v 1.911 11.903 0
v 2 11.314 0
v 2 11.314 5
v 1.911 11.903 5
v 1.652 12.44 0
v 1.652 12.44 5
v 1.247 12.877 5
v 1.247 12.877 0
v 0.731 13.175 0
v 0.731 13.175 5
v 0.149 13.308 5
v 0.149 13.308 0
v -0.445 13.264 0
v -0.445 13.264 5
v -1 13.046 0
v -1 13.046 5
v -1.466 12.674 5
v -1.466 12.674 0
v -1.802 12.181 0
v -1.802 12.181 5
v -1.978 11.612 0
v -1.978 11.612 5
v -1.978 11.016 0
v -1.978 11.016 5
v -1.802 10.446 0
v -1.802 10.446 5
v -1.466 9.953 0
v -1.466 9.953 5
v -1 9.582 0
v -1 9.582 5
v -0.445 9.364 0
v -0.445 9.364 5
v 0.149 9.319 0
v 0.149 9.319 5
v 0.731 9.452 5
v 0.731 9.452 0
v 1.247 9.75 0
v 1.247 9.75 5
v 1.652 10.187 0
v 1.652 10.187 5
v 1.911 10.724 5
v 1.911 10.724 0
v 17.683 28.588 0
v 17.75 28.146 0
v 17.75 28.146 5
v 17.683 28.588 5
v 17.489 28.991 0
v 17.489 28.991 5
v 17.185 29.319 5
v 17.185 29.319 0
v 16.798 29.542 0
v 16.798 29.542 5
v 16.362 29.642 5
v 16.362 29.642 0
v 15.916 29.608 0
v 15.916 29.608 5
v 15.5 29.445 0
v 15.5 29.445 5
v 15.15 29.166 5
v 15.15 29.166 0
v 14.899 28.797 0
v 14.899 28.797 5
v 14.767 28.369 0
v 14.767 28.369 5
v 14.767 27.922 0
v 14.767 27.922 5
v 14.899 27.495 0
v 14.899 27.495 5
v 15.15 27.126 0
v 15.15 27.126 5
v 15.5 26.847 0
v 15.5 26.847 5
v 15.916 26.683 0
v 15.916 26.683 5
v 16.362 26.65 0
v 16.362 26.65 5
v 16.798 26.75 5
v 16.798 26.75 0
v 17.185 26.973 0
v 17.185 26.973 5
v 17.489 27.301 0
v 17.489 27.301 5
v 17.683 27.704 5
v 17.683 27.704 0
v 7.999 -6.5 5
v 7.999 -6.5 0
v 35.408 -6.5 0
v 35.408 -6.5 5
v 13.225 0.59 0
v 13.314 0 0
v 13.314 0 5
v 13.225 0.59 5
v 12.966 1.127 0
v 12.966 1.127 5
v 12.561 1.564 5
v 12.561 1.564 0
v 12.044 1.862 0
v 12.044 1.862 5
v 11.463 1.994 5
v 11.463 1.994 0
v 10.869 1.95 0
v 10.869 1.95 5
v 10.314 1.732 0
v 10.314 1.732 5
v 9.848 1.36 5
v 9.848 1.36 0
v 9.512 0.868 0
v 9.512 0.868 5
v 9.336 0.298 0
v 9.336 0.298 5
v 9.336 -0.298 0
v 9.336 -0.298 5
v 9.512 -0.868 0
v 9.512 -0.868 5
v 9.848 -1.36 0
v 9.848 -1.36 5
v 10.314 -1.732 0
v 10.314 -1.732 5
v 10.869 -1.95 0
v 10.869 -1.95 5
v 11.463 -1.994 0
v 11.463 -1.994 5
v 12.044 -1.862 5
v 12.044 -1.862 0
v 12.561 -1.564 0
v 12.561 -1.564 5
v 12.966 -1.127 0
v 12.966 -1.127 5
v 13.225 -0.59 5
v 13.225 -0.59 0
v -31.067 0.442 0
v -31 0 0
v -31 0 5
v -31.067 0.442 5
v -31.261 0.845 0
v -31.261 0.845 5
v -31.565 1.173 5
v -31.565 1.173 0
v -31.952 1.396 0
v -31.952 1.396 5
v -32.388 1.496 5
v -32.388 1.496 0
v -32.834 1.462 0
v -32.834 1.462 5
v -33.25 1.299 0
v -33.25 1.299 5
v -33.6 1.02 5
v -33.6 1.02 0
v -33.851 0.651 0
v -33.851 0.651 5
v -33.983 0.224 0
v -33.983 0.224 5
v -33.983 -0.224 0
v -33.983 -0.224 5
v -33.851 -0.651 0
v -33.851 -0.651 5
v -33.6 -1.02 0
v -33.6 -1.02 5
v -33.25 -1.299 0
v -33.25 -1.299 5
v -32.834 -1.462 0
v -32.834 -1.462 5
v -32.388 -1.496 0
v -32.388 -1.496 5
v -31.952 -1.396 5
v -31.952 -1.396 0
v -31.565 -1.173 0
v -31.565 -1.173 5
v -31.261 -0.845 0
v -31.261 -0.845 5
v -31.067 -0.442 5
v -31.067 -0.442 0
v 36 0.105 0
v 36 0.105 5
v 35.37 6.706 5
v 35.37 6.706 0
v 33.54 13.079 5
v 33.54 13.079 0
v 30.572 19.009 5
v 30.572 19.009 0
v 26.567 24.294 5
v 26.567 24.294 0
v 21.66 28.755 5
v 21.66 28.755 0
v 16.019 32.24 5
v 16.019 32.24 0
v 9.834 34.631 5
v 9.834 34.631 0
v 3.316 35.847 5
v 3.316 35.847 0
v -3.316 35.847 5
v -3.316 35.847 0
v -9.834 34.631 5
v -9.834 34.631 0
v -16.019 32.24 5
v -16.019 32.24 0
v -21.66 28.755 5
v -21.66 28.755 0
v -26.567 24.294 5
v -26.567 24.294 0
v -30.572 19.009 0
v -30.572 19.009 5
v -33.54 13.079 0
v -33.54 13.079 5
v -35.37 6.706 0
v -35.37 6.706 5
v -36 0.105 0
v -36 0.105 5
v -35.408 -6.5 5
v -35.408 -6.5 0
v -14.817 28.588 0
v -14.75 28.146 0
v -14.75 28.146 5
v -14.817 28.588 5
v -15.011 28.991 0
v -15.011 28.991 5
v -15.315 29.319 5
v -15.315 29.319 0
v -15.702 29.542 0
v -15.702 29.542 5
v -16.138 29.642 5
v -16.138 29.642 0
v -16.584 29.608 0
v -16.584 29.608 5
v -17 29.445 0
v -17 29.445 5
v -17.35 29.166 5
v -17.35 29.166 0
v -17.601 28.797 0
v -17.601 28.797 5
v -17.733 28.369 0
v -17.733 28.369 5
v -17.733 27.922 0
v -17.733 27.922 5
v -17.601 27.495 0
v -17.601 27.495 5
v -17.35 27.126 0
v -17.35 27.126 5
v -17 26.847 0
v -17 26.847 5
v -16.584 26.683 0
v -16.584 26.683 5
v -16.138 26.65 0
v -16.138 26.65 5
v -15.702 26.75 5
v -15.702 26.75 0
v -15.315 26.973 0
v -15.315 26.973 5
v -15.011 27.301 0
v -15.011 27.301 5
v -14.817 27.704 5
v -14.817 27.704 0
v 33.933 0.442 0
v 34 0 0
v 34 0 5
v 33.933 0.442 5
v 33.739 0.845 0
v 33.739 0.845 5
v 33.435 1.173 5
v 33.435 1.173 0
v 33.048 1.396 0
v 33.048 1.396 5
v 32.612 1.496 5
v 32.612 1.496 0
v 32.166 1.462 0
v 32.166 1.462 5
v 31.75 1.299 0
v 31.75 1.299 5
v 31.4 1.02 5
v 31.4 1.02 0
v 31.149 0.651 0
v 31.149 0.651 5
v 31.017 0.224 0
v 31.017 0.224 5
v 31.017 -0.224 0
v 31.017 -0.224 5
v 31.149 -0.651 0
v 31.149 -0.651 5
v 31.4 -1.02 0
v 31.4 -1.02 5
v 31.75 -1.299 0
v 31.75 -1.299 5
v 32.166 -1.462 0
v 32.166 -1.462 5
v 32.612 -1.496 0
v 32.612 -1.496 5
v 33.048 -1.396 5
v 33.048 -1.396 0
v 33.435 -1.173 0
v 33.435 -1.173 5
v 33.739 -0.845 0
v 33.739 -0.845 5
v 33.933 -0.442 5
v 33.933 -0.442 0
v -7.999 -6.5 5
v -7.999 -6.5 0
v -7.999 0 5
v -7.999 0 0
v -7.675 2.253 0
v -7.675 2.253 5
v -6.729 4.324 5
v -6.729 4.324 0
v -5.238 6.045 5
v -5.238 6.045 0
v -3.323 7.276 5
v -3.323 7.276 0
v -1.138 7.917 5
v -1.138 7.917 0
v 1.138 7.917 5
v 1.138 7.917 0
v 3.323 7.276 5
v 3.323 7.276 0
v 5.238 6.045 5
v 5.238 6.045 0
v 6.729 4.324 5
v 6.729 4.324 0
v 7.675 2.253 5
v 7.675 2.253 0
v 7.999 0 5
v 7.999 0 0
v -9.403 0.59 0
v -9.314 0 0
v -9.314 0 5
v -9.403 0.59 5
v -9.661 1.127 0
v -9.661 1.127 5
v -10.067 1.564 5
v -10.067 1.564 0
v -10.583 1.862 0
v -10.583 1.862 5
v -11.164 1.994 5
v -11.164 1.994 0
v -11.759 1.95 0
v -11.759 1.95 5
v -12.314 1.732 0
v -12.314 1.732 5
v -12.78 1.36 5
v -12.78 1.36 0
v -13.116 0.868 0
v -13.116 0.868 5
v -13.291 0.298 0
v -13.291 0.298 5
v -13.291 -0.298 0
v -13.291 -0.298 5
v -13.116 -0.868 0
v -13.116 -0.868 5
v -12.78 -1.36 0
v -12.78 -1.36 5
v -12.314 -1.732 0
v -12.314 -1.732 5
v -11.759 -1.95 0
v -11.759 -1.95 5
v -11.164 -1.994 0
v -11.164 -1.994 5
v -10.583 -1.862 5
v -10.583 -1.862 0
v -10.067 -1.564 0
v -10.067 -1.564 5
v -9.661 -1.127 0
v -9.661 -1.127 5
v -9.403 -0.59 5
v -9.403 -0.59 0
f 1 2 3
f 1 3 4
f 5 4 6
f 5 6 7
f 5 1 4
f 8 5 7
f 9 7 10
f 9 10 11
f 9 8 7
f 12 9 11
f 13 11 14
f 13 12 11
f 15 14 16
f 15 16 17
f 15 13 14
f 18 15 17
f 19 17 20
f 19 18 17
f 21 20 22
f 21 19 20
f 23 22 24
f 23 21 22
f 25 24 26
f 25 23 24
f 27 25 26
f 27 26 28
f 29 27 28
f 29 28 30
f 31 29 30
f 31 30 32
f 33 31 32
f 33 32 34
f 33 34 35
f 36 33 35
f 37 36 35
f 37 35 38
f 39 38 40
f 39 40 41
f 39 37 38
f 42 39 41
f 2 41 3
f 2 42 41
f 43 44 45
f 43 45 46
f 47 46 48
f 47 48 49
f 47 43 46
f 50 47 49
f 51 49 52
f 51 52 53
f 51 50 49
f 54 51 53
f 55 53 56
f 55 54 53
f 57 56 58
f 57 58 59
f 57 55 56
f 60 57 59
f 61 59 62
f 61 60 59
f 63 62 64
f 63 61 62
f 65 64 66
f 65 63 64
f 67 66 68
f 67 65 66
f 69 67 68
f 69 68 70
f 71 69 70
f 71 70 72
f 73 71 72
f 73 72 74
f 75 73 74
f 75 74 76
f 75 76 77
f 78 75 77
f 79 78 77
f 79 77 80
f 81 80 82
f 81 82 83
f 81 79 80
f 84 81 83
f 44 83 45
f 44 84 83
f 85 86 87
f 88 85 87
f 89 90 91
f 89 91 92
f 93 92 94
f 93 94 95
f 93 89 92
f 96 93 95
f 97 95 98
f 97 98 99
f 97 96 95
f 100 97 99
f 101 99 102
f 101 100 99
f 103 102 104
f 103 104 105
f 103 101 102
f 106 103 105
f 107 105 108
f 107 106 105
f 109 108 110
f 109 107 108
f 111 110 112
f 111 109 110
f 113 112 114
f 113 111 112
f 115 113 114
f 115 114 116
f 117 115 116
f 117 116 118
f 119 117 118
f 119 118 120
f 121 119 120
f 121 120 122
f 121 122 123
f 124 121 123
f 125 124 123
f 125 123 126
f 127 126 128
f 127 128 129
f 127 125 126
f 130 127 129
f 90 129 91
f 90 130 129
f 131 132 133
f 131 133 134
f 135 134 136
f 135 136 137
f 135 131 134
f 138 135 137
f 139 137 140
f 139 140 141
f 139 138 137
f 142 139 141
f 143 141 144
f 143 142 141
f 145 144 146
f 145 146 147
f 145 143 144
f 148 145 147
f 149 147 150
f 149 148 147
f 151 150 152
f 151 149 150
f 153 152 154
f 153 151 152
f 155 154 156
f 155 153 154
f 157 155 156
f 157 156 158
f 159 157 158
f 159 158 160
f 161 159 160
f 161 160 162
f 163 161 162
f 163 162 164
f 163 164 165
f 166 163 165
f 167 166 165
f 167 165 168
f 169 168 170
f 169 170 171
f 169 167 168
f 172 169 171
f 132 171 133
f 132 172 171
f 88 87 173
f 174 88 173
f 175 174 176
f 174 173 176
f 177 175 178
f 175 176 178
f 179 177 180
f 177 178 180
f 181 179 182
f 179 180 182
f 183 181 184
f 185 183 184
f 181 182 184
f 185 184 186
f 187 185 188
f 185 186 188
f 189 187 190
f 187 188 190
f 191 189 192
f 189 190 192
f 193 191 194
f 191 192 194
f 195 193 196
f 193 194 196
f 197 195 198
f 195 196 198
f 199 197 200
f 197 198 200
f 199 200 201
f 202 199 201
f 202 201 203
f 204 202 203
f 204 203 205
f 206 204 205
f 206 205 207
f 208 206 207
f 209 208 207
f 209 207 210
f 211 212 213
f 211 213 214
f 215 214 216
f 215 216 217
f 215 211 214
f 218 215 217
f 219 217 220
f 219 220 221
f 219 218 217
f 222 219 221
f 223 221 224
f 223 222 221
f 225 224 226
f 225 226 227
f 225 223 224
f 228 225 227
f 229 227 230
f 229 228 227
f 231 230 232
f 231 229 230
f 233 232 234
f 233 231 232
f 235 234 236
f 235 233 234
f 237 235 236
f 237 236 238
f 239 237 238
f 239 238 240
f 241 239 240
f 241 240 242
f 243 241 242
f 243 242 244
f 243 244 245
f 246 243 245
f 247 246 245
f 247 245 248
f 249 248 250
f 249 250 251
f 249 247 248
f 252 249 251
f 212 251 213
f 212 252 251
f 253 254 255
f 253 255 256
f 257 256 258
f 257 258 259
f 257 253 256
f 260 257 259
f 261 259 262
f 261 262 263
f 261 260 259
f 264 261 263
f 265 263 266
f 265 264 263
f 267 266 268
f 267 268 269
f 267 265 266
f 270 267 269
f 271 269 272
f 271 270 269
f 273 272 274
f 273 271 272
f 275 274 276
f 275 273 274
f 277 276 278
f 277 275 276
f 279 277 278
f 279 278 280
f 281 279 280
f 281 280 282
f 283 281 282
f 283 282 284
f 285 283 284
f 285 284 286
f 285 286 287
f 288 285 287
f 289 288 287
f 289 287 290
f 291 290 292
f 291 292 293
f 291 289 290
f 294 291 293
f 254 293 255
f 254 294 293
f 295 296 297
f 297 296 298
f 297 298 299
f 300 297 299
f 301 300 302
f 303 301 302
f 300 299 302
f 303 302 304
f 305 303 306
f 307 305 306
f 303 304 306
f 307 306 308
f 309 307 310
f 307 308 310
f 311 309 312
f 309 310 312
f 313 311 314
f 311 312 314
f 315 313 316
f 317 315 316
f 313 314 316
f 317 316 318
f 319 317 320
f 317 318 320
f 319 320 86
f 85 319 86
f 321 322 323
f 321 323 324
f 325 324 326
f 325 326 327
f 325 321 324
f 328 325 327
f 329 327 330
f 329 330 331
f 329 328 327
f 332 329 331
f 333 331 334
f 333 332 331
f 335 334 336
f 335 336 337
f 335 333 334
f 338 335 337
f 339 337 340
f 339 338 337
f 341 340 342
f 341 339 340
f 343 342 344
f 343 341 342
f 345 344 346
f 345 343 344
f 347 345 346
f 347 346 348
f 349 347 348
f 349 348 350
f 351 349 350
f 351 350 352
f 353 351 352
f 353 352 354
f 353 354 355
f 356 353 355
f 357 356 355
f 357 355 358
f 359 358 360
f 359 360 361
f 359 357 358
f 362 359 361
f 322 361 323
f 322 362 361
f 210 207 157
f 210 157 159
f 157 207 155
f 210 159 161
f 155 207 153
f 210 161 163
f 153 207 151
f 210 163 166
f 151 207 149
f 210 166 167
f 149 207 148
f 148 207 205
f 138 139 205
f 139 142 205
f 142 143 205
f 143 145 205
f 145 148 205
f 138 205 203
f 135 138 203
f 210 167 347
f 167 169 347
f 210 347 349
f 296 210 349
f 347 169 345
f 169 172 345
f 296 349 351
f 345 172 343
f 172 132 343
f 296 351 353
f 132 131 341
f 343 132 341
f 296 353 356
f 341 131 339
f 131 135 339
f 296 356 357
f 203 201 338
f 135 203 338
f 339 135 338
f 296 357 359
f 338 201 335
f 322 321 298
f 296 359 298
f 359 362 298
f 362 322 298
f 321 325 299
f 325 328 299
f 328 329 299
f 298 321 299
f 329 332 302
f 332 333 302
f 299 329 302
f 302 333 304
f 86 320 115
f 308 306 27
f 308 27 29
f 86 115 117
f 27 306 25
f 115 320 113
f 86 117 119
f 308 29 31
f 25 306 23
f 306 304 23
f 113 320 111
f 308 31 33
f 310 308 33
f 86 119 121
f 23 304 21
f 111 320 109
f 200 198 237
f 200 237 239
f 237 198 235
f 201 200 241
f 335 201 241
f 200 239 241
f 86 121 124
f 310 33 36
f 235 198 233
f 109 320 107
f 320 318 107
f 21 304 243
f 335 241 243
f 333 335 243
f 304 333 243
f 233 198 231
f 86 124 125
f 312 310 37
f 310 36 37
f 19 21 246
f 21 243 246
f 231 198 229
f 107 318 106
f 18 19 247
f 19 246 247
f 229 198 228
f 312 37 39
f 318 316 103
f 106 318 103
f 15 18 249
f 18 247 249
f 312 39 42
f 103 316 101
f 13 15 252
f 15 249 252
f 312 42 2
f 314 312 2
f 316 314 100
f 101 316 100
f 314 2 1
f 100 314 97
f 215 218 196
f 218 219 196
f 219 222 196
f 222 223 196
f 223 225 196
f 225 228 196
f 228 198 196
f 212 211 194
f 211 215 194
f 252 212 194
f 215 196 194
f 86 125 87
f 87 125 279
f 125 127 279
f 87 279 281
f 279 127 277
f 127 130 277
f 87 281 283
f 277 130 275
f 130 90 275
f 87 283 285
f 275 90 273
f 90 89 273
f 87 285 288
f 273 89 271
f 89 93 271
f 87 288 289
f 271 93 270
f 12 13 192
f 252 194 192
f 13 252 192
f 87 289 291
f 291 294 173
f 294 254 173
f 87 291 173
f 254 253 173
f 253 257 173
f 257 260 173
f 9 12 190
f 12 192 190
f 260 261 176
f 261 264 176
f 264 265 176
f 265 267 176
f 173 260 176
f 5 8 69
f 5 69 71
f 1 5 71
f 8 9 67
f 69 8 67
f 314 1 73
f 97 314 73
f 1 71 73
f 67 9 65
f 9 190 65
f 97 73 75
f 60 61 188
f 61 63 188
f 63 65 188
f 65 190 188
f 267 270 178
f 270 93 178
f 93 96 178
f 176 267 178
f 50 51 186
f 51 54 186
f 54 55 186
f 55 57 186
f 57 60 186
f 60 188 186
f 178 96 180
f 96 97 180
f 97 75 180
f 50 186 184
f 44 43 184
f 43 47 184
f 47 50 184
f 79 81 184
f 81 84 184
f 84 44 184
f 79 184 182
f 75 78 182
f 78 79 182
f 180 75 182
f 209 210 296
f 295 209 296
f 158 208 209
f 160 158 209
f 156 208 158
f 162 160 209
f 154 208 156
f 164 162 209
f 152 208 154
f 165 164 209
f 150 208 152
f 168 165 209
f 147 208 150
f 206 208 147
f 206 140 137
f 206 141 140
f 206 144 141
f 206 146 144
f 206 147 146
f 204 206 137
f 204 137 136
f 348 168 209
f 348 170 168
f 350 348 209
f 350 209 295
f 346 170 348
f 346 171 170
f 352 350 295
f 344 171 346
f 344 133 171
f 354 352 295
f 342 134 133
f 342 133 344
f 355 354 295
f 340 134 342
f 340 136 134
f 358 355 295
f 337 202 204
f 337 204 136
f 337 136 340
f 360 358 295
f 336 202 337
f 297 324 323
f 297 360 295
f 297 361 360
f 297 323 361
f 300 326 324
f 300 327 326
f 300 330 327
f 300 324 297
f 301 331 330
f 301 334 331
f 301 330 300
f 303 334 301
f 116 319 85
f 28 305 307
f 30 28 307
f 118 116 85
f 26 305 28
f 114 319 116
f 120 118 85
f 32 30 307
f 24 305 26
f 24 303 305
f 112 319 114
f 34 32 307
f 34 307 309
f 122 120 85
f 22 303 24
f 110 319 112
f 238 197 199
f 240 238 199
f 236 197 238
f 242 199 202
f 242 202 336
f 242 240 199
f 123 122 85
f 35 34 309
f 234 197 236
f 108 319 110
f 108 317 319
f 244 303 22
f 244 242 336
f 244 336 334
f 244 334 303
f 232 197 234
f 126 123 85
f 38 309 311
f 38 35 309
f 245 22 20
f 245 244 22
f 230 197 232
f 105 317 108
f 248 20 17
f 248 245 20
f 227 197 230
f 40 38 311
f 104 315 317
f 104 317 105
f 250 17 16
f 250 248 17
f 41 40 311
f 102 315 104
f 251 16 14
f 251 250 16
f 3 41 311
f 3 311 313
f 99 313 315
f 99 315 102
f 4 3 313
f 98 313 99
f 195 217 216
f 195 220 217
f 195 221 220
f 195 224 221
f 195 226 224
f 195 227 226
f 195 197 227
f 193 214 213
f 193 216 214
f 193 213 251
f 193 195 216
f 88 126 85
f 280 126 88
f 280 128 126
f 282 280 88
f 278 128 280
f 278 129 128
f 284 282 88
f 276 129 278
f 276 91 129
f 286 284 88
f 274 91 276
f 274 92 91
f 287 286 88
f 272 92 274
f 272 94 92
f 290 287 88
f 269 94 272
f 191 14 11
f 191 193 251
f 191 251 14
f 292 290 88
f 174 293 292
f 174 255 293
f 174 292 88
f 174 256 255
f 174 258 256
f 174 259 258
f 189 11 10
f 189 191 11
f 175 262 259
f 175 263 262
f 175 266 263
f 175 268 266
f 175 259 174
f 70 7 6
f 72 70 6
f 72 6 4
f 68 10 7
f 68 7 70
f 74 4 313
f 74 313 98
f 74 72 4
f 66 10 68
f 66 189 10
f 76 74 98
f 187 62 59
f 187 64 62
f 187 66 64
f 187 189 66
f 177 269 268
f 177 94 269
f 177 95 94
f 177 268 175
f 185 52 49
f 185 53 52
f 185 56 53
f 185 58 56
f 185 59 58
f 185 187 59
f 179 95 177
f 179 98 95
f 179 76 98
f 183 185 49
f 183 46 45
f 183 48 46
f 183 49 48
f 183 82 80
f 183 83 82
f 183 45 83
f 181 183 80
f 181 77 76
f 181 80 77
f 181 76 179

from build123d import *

# Parameters (mm, degrees)
SKETCH1_R           = 1.5
SKETCH1_R_2         = 2
BOSS_EXTRUDE1_DEPTH = 5


with BuildPart() as part:
    # Sketch1 → Boss-Extrude1 (new body)
    with BuildSketch(Plane.XY):
        with BuildLine():
            ThreePointArc((35.408332353, -6.5), (0, 36), (-35.408332353, -6.5))
            Line((-35.408332353, -6.5), (-7.998604295, -6.5))
            Line((-7.998604295, -6.5), (-7.998604295, 0))
            ThreePointArc((-7.998604295, 0), (0, 7.998604295), (7.998604295, 0))
            Line((7.998604295, 0), (7.998604295, -6.5))
            Line((7.998604295, -6.5), (35.408332353, -6.5))
        make_face()
        with Locations((-32.5, 0)):
            Circle(SKETCH1_R, mode=Mode.SUBTRACT)
        with Locations((-11.313708499, 0)):
            Circle(SKETCH1_R_2, mode=Mode.SUBTRACT)
        with Locations((0, 11.313708499)):
            Circle(SKETCH1_R_2, mode=Mode.SUBTRACT)
        with Locations((11.313708499, 0)):
            Circle(SKETCH1_R_2, mode=Mode.SUBTRACT)
        with Locations((32.5, 0)):
            Circle(SKETCH1_R, mode=Mode.SUBTRACT)
        with Locations((-16.25, 28.145825623)):
            Circle(SKETCH1_R, mode=Mode.SUBTRACT)
        with Locations((16.25, 28.145825623)):
            Circle(SKETCH1_R, mode=Mode.SUBTRACT)
    extrude(amount=BOSS_EXTRUDE1_DEPTH)


solid = part.part
